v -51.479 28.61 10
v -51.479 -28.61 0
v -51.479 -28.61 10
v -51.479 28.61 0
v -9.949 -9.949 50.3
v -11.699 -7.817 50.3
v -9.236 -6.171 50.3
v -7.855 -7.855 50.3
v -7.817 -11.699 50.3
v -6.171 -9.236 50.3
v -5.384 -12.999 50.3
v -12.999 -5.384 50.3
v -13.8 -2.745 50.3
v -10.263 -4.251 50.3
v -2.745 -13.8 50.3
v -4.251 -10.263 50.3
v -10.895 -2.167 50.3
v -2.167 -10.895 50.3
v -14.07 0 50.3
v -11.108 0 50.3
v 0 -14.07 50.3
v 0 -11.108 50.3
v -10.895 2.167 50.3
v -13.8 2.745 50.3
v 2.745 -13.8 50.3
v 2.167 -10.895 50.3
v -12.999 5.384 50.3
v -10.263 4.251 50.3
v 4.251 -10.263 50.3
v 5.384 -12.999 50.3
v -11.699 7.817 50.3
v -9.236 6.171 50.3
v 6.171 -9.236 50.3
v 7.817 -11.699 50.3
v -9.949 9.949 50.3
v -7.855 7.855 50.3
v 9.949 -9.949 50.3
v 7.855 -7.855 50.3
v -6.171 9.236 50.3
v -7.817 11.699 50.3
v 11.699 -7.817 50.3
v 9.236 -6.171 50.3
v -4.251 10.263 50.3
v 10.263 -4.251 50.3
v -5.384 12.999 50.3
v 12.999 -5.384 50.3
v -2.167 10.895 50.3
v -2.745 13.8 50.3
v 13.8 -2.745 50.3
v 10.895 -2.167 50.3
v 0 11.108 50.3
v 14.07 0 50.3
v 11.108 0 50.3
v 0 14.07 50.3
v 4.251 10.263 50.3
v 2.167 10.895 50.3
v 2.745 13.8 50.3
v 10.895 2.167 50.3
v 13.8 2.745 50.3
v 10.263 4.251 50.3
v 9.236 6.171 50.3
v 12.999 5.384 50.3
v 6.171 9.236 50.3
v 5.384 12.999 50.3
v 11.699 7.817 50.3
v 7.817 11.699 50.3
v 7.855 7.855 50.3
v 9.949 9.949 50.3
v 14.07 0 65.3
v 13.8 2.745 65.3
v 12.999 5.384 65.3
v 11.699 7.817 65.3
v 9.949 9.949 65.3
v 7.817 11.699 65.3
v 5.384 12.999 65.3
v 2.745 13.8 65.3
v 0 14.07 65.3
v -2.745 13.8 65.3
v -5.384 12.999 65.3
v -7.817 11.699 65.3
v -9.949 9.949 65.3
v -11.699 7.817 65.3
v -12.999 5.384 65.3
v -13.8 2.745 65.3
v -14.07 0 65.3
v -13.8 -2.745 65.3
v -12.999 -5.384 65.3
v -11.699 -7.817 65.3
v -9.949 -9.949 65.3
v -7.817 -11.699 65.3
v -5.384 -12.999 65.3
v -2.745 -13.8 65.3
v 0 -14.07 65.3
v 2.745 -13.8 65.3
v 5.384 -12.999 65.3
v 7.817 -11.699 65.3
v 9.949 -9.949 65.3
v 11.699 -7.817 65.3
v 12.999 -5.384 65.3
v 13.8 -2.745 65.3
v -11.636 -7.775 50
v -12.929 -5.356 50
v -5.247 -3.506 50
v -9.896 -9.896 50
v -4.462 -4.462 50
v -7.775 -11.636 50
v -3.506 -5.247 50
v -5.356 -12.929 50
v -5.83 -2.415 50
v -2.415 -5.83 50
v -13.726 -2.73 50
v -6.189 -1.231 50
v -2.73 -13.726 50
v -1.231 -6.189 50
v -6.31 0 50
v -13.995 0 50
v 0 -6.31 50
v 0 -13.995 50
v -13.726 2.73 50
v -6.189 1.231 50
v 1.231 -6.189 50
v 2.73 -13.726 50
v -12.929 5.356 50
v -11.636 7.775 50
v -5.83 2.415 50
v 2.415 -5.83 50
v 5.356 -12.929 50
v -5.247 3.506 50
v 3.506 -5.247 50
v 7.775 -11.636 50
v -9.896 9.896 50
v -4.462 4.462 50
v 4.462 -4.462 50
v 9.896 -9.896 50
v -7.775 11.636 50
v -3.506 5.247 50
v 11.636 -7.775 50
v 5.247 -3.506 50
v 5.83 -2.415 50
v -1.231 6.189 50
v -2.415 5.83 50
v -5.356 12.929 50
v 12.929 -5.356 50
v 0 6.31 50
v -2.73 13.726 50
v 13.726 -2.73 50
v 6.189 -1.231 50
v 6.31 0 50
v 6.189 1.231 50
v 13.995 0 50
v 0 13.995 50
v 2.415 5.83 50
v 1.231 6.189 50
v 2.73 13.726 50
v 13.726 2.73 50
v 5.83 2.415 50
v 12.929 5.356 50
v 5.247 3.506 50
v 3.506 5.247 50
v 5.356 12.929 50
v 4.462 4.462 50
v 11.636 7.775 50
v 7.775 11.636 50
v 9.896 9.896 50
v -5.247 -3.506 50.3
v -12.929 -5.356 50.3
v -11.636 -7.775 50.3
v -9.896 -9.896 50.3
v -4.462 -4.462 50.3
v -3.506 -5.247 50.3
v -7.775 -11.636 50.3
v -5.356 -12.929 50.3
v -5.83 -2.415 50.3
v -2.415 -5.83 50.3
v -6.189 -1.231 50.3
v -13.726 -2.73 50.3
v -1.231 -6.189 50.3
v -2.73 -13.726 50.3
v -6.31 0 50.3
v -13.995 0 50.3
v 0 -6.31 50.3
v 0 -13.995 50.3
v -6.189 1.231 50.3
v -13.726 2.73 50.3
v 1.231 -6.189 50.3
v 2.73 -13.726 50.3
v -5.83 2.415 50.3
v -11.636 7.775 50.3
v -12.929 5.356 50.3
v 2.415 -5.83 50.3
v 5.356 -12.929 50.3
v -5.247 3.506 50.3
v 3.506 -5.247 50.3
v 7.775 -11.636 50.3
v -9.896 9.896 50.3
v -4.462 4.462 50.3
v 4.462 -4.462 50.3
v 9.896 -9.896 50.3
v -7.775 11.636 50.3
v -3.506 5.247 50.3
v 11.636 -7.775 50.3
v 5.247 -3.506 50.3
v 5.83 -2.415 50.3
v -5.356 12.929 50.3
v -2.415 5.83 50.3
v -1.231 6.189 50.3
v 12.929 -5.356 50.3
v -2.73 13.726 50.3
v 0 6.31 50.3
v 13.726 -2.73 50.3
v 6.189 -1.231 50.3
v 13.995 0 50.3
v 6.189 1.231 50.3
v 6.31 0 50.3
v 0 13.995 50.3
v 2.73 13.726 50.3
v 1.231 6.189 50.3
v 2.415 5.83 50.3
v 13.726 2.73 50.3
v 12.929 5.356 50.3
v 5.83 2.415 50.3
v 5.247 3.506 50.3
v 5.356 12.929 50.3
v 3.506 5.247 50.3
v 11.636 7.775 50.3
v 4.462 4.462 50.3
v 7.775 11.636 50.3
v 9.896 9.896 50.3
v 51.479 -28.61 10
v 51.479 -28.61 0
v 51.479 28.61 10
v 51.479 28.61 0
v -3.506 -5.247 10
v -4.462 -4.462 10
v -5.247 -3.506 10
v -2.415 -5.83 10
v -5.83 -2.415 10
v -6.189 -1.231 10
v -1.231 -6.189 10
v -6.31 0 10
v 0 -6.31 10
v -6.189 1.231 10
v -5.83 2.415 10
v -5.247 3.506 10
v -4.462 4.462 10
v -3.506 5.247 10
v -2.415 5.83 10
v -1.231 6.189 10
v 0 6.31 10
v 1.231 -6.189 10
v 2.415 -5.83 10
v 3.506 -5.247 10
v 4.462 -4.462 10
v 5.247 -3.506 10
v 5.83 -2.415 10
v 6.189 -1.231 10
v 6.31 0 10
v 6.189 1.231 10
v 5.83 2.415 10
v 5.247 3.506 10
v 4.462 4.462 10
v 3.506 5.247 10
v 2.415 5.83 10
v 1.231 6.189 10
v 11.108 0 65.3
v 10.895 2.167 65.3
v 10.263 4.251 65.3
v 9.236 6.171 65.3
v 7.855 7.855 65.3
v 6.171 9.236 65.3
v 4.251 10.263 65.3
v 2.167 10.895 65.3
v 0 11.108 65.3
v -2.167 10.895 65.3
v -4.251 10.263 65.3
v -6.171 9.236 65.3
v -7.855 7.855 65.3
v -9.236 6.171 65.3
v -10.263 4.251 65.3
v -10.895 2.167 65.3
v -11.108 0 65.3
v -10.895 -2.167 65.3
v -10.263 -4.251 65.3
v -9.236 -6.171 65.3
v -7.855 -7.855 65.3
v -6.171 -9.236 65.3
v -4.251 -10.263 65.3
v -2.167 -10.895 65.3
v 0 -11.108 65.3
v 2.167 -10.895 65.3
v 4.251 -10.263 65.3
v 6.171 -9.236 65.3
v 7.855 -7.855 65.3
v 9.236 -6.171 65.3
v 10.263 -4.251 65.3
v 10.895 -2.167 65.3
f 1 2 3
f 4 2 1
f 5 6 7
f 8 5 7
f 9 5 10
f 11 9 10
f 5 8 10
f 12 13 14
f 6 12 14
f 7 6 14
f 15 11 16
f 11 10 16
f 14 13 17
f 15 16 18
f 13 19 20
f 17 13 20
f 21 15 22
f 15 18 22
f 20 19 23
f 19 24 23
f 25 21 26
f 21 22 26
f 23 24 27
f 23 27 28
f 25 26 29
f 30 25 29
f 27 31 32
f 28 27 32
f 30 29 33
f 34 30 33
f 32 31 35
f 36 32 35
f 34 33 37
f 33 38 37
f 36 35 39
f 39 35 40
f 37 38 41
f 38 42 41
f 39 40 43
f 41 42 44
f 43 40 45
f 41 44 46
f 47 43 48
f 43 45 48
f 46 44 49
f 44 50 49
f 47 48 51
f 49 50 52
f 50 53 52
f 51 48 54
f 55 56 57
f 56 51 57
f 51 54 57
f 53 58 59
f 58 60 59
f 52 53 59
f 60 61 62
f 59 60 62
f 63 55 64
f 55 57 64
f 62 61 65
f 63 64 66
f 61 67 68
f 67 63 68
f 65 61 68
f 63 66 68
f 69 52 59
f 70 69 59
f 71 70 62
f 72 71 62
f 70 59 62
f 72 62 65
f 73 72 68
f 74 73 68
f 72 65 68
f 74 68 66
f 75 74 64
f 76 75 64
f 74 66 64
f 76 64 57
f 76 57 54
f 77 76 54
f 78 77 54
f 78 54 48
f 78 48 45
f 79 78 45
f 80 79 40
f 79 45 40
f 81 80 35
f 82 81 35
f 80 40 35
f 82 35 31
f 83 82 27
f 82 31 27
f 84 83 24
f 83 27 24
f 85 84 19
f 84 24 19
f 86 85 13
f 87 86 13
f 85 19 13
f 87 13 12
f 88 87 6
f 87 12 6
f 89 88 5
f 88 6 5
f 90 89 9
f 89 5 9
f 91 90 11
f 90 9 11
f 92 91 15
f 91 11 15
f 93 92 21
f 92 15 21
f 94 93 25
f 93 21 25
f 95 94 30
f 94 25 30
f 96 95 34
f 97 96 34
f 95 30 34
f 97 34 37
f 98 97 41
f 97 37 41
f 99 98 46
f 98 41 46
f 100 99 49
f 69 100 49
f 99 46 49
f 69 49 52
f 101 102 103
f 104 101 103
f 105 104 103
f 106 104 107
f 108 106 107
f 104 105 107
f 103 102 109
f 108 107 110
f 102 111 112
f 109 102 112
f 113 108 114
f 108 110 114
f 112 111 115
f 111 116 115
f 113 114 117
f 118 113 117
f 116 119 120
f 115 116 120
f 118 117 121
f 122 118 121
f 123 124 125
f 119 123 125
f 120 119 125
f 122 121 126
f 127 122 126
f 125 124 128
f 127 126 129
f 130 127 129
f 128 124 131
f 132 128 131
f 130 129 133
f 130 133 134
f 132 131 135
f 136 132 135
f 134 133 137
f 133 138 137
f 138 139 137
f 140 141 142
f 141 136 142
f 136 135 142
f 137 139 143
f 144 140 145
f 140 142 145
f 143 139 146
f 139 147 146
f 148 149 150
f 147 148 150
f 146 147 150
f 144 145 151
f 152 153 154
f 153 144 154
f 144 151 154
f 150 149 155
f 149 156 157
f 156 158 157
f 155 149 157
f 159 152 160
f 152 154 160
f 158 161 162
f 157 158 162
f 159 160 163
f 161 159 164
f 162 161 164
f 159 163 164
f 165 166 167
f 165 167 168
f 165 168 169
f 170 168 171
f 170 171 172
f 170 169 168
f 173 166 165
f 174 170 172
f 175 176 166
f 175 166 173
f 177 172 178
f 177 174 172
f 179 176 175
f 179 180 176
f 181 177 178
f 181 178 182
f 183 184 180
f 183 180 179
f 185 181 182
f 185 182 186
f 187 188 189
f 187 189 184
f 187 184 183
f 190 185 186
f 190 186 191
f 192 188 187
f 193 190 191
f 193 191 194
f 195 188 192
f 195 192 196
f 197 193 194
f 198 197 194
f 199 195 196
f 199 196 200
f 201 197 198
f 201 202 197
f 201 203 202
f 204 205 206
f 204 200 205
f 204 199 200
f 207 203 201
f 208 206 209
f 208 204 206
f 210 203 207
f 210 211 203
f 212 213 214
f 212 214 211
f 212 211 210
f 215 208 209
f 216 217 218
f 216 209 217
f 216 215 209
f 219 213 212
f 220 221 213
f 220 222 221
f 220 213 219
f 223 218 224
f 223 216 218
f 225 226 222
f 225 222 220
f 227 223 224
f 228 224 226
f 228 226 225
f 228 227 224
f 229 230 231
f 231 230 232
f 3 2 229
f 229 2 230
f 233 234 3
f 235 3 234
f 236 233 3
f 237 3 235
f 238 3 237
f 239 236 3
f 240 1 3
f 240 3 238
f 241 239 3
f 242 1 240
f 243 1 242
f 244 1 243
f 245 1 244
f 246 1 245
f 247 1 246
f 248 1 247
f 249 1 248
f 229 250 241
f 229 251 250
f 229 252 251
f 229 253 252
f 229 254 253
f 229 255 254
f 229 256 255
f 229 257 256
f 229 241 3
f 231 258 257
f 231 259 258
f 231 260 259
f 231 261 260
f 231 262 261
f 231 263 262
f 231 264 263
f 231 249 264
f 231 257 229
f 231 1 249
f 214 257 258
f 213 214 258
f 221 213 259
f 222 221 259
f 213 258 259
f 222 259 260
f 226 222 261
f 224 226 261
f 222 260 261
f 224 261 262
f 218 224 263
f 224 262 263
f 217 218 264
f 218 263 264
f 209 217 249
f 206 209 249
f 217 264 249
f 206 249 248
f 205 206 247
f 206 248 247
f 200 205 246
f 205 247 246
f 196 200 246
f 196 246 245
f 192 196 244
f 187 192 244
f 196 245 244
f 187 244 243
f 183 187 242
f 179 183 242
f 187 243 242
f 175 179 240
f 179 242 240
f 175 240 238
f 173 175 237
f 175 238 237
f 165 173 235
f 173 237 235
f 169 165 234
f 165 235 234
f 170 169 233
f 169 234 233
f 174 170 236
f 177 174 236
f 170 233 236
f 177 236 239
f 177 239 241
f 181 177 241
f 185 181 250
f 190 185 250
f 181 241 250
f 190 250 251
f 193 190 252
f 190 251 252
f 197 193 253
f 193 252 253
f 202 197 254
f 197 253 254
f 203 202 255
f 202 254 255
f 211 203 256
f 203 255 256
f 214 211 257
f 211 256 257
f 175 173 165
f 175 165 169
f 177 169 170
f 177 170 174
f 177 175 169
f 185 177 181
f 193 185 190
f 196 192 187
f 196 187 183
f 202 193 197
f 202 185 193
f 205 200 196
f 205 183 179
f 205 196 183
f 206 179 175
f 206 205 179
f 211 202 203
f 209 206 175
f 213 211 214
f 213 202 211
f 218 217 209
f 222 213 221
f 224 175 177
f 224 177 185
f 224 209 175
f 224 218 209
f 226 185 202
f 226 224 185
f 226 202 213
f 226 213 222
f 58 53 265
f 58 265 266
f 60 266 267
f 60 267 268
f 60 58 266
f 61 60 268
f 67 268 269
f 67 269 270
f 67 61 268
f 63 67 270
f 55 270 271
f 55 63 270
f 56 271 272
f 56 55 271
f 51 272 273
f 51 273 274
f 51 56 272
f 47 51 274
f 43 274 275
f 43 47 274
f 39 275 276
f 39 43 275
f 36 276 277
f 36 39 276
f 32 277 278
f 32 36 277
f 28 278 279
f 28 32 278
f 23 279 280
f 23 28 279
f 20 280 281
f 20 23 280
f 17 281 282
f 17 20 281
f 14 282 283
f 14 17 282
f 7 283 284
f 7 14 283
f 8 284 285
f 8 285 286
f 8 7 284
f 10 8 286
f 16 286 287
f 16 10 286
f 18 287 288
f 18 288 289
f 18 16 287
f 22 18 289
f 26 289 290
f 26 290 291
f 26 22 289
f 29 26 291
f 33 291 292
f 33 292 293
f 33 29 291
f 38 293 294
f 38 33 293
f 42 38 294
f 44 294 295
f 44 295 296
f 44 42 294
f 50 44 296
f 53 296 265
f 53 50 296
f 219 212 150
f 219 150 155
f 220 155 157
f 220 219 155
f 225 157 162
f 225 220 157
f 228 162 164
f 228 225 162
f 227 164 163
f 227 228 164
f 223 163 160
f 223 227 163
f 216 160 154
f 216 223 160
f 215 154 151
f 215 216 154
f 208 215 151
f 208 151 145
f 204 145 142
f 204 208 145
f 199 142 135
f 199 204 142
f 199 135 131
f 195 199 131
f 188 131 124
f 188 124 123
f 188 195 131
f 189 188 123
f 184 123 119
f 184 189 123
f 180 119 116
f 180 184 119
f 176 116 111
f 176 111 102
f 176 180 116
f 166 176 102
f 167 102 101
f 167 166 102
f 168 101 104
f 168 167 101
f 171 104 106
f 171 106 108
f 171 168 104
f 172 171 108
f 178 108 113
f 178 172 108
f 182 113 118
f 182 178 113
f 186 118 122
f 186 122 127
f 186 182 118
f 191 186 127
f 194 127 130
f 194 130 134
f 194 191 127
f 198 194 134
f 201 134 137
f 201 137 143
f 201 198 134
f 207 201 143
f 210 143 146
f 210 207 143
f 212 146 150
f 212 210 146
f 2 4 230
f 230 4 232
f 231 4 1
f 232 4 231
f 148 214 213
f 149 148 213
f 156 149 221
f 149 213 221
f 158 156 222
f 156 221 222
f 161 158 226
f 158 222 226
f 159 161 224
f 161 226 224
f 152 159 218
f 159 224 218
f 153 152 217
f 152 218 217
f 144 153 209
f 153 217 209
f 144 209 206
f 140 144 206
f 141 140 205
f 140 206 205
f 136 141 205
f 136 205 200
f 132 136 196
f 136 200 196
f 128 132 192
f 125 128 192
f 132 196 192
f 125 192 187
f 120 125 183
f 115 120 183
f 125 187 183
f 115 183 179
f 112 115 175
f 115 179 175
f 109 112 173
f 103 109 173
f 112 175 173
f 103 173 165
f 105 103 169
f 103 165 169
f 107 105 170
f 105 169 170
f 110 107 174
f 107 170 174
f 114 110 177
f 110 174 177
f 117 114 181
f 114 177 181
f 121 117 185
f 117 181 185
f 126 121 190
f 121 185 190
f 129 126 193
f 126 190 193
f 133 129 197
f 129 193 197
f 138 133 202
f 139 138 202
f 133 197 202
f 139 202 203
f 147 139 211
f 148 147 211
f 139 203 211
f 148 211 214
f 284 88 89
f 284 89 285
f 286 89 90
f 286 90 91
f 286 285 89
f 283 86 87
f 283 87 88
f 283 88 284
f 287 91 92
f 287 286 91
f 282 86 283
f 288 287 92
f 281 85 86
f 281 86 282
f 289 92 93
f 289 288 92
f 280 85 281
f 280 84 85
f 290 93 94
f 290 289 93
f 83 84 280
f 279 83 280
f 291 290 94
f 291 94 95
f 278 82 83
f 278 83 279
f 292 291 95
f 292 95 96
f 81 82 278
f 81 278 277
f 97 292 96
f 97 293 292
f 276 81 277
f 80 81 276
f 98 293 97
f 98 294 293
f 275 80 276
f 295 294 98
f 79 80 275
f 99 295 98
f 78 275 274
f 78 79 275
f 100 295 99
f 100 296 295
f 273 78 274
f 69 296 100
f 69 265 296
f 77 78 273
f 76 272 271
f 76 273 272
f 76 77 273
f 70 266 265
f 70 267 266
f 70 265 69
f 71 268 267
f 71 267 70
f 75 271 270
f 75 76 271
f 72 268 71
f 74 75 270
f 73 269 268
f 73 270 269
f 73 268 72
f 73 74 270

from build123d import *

# Parameters (mm, degrees)
F0_W     = 102.958694
F0_H     = 57.220538
F1_DEPTH = 10
F2_R     = 6.310234
F3_DEPTH = 40.3
F4_R     = 14.070264
F4_R_2   = 11.108131
F5_DEPTH = 15
F6_R     = 13.994763
F6_R_2   = 6.310234
F7_DEPTH = 0.3


with BuildPart() as f1:
    # F0 (on Top) → F1 (new body)
    with BuildSketch(Plane.XY):
        Rectangle(F0_W, F0_H)
    extrude(amount=F1_DEPTH)

    # F2 (on face) → F3 (join)
    with BuildSketch(Plane.XY.offset(10)):
        Circle(F2_R)
    extrude(amount=F3_DEPTH)


with BuildPart() as f5:
    # F4 (on face) → F5 (new body)
    with BuildSketch(Plane.XY.offset(50.3)):
        Circle(F4_R)
        Circle(F4_R_2, mode=Mode.SUBTRACT)
    extrude(amount=F5_DEPTH)


with BuildPart() as f7:
    # F6 (on face) → F7 (new body)
    with BuildSketch(Plane.XY.offset(50.3)):
        Circle(F6_R)
        Circle(F6_R_2, mode=Mode.SUBTRACT)
    extrude(amount=-F7_DEPTH)


solid = Compound([f1.part, f5.part, f7.part])
